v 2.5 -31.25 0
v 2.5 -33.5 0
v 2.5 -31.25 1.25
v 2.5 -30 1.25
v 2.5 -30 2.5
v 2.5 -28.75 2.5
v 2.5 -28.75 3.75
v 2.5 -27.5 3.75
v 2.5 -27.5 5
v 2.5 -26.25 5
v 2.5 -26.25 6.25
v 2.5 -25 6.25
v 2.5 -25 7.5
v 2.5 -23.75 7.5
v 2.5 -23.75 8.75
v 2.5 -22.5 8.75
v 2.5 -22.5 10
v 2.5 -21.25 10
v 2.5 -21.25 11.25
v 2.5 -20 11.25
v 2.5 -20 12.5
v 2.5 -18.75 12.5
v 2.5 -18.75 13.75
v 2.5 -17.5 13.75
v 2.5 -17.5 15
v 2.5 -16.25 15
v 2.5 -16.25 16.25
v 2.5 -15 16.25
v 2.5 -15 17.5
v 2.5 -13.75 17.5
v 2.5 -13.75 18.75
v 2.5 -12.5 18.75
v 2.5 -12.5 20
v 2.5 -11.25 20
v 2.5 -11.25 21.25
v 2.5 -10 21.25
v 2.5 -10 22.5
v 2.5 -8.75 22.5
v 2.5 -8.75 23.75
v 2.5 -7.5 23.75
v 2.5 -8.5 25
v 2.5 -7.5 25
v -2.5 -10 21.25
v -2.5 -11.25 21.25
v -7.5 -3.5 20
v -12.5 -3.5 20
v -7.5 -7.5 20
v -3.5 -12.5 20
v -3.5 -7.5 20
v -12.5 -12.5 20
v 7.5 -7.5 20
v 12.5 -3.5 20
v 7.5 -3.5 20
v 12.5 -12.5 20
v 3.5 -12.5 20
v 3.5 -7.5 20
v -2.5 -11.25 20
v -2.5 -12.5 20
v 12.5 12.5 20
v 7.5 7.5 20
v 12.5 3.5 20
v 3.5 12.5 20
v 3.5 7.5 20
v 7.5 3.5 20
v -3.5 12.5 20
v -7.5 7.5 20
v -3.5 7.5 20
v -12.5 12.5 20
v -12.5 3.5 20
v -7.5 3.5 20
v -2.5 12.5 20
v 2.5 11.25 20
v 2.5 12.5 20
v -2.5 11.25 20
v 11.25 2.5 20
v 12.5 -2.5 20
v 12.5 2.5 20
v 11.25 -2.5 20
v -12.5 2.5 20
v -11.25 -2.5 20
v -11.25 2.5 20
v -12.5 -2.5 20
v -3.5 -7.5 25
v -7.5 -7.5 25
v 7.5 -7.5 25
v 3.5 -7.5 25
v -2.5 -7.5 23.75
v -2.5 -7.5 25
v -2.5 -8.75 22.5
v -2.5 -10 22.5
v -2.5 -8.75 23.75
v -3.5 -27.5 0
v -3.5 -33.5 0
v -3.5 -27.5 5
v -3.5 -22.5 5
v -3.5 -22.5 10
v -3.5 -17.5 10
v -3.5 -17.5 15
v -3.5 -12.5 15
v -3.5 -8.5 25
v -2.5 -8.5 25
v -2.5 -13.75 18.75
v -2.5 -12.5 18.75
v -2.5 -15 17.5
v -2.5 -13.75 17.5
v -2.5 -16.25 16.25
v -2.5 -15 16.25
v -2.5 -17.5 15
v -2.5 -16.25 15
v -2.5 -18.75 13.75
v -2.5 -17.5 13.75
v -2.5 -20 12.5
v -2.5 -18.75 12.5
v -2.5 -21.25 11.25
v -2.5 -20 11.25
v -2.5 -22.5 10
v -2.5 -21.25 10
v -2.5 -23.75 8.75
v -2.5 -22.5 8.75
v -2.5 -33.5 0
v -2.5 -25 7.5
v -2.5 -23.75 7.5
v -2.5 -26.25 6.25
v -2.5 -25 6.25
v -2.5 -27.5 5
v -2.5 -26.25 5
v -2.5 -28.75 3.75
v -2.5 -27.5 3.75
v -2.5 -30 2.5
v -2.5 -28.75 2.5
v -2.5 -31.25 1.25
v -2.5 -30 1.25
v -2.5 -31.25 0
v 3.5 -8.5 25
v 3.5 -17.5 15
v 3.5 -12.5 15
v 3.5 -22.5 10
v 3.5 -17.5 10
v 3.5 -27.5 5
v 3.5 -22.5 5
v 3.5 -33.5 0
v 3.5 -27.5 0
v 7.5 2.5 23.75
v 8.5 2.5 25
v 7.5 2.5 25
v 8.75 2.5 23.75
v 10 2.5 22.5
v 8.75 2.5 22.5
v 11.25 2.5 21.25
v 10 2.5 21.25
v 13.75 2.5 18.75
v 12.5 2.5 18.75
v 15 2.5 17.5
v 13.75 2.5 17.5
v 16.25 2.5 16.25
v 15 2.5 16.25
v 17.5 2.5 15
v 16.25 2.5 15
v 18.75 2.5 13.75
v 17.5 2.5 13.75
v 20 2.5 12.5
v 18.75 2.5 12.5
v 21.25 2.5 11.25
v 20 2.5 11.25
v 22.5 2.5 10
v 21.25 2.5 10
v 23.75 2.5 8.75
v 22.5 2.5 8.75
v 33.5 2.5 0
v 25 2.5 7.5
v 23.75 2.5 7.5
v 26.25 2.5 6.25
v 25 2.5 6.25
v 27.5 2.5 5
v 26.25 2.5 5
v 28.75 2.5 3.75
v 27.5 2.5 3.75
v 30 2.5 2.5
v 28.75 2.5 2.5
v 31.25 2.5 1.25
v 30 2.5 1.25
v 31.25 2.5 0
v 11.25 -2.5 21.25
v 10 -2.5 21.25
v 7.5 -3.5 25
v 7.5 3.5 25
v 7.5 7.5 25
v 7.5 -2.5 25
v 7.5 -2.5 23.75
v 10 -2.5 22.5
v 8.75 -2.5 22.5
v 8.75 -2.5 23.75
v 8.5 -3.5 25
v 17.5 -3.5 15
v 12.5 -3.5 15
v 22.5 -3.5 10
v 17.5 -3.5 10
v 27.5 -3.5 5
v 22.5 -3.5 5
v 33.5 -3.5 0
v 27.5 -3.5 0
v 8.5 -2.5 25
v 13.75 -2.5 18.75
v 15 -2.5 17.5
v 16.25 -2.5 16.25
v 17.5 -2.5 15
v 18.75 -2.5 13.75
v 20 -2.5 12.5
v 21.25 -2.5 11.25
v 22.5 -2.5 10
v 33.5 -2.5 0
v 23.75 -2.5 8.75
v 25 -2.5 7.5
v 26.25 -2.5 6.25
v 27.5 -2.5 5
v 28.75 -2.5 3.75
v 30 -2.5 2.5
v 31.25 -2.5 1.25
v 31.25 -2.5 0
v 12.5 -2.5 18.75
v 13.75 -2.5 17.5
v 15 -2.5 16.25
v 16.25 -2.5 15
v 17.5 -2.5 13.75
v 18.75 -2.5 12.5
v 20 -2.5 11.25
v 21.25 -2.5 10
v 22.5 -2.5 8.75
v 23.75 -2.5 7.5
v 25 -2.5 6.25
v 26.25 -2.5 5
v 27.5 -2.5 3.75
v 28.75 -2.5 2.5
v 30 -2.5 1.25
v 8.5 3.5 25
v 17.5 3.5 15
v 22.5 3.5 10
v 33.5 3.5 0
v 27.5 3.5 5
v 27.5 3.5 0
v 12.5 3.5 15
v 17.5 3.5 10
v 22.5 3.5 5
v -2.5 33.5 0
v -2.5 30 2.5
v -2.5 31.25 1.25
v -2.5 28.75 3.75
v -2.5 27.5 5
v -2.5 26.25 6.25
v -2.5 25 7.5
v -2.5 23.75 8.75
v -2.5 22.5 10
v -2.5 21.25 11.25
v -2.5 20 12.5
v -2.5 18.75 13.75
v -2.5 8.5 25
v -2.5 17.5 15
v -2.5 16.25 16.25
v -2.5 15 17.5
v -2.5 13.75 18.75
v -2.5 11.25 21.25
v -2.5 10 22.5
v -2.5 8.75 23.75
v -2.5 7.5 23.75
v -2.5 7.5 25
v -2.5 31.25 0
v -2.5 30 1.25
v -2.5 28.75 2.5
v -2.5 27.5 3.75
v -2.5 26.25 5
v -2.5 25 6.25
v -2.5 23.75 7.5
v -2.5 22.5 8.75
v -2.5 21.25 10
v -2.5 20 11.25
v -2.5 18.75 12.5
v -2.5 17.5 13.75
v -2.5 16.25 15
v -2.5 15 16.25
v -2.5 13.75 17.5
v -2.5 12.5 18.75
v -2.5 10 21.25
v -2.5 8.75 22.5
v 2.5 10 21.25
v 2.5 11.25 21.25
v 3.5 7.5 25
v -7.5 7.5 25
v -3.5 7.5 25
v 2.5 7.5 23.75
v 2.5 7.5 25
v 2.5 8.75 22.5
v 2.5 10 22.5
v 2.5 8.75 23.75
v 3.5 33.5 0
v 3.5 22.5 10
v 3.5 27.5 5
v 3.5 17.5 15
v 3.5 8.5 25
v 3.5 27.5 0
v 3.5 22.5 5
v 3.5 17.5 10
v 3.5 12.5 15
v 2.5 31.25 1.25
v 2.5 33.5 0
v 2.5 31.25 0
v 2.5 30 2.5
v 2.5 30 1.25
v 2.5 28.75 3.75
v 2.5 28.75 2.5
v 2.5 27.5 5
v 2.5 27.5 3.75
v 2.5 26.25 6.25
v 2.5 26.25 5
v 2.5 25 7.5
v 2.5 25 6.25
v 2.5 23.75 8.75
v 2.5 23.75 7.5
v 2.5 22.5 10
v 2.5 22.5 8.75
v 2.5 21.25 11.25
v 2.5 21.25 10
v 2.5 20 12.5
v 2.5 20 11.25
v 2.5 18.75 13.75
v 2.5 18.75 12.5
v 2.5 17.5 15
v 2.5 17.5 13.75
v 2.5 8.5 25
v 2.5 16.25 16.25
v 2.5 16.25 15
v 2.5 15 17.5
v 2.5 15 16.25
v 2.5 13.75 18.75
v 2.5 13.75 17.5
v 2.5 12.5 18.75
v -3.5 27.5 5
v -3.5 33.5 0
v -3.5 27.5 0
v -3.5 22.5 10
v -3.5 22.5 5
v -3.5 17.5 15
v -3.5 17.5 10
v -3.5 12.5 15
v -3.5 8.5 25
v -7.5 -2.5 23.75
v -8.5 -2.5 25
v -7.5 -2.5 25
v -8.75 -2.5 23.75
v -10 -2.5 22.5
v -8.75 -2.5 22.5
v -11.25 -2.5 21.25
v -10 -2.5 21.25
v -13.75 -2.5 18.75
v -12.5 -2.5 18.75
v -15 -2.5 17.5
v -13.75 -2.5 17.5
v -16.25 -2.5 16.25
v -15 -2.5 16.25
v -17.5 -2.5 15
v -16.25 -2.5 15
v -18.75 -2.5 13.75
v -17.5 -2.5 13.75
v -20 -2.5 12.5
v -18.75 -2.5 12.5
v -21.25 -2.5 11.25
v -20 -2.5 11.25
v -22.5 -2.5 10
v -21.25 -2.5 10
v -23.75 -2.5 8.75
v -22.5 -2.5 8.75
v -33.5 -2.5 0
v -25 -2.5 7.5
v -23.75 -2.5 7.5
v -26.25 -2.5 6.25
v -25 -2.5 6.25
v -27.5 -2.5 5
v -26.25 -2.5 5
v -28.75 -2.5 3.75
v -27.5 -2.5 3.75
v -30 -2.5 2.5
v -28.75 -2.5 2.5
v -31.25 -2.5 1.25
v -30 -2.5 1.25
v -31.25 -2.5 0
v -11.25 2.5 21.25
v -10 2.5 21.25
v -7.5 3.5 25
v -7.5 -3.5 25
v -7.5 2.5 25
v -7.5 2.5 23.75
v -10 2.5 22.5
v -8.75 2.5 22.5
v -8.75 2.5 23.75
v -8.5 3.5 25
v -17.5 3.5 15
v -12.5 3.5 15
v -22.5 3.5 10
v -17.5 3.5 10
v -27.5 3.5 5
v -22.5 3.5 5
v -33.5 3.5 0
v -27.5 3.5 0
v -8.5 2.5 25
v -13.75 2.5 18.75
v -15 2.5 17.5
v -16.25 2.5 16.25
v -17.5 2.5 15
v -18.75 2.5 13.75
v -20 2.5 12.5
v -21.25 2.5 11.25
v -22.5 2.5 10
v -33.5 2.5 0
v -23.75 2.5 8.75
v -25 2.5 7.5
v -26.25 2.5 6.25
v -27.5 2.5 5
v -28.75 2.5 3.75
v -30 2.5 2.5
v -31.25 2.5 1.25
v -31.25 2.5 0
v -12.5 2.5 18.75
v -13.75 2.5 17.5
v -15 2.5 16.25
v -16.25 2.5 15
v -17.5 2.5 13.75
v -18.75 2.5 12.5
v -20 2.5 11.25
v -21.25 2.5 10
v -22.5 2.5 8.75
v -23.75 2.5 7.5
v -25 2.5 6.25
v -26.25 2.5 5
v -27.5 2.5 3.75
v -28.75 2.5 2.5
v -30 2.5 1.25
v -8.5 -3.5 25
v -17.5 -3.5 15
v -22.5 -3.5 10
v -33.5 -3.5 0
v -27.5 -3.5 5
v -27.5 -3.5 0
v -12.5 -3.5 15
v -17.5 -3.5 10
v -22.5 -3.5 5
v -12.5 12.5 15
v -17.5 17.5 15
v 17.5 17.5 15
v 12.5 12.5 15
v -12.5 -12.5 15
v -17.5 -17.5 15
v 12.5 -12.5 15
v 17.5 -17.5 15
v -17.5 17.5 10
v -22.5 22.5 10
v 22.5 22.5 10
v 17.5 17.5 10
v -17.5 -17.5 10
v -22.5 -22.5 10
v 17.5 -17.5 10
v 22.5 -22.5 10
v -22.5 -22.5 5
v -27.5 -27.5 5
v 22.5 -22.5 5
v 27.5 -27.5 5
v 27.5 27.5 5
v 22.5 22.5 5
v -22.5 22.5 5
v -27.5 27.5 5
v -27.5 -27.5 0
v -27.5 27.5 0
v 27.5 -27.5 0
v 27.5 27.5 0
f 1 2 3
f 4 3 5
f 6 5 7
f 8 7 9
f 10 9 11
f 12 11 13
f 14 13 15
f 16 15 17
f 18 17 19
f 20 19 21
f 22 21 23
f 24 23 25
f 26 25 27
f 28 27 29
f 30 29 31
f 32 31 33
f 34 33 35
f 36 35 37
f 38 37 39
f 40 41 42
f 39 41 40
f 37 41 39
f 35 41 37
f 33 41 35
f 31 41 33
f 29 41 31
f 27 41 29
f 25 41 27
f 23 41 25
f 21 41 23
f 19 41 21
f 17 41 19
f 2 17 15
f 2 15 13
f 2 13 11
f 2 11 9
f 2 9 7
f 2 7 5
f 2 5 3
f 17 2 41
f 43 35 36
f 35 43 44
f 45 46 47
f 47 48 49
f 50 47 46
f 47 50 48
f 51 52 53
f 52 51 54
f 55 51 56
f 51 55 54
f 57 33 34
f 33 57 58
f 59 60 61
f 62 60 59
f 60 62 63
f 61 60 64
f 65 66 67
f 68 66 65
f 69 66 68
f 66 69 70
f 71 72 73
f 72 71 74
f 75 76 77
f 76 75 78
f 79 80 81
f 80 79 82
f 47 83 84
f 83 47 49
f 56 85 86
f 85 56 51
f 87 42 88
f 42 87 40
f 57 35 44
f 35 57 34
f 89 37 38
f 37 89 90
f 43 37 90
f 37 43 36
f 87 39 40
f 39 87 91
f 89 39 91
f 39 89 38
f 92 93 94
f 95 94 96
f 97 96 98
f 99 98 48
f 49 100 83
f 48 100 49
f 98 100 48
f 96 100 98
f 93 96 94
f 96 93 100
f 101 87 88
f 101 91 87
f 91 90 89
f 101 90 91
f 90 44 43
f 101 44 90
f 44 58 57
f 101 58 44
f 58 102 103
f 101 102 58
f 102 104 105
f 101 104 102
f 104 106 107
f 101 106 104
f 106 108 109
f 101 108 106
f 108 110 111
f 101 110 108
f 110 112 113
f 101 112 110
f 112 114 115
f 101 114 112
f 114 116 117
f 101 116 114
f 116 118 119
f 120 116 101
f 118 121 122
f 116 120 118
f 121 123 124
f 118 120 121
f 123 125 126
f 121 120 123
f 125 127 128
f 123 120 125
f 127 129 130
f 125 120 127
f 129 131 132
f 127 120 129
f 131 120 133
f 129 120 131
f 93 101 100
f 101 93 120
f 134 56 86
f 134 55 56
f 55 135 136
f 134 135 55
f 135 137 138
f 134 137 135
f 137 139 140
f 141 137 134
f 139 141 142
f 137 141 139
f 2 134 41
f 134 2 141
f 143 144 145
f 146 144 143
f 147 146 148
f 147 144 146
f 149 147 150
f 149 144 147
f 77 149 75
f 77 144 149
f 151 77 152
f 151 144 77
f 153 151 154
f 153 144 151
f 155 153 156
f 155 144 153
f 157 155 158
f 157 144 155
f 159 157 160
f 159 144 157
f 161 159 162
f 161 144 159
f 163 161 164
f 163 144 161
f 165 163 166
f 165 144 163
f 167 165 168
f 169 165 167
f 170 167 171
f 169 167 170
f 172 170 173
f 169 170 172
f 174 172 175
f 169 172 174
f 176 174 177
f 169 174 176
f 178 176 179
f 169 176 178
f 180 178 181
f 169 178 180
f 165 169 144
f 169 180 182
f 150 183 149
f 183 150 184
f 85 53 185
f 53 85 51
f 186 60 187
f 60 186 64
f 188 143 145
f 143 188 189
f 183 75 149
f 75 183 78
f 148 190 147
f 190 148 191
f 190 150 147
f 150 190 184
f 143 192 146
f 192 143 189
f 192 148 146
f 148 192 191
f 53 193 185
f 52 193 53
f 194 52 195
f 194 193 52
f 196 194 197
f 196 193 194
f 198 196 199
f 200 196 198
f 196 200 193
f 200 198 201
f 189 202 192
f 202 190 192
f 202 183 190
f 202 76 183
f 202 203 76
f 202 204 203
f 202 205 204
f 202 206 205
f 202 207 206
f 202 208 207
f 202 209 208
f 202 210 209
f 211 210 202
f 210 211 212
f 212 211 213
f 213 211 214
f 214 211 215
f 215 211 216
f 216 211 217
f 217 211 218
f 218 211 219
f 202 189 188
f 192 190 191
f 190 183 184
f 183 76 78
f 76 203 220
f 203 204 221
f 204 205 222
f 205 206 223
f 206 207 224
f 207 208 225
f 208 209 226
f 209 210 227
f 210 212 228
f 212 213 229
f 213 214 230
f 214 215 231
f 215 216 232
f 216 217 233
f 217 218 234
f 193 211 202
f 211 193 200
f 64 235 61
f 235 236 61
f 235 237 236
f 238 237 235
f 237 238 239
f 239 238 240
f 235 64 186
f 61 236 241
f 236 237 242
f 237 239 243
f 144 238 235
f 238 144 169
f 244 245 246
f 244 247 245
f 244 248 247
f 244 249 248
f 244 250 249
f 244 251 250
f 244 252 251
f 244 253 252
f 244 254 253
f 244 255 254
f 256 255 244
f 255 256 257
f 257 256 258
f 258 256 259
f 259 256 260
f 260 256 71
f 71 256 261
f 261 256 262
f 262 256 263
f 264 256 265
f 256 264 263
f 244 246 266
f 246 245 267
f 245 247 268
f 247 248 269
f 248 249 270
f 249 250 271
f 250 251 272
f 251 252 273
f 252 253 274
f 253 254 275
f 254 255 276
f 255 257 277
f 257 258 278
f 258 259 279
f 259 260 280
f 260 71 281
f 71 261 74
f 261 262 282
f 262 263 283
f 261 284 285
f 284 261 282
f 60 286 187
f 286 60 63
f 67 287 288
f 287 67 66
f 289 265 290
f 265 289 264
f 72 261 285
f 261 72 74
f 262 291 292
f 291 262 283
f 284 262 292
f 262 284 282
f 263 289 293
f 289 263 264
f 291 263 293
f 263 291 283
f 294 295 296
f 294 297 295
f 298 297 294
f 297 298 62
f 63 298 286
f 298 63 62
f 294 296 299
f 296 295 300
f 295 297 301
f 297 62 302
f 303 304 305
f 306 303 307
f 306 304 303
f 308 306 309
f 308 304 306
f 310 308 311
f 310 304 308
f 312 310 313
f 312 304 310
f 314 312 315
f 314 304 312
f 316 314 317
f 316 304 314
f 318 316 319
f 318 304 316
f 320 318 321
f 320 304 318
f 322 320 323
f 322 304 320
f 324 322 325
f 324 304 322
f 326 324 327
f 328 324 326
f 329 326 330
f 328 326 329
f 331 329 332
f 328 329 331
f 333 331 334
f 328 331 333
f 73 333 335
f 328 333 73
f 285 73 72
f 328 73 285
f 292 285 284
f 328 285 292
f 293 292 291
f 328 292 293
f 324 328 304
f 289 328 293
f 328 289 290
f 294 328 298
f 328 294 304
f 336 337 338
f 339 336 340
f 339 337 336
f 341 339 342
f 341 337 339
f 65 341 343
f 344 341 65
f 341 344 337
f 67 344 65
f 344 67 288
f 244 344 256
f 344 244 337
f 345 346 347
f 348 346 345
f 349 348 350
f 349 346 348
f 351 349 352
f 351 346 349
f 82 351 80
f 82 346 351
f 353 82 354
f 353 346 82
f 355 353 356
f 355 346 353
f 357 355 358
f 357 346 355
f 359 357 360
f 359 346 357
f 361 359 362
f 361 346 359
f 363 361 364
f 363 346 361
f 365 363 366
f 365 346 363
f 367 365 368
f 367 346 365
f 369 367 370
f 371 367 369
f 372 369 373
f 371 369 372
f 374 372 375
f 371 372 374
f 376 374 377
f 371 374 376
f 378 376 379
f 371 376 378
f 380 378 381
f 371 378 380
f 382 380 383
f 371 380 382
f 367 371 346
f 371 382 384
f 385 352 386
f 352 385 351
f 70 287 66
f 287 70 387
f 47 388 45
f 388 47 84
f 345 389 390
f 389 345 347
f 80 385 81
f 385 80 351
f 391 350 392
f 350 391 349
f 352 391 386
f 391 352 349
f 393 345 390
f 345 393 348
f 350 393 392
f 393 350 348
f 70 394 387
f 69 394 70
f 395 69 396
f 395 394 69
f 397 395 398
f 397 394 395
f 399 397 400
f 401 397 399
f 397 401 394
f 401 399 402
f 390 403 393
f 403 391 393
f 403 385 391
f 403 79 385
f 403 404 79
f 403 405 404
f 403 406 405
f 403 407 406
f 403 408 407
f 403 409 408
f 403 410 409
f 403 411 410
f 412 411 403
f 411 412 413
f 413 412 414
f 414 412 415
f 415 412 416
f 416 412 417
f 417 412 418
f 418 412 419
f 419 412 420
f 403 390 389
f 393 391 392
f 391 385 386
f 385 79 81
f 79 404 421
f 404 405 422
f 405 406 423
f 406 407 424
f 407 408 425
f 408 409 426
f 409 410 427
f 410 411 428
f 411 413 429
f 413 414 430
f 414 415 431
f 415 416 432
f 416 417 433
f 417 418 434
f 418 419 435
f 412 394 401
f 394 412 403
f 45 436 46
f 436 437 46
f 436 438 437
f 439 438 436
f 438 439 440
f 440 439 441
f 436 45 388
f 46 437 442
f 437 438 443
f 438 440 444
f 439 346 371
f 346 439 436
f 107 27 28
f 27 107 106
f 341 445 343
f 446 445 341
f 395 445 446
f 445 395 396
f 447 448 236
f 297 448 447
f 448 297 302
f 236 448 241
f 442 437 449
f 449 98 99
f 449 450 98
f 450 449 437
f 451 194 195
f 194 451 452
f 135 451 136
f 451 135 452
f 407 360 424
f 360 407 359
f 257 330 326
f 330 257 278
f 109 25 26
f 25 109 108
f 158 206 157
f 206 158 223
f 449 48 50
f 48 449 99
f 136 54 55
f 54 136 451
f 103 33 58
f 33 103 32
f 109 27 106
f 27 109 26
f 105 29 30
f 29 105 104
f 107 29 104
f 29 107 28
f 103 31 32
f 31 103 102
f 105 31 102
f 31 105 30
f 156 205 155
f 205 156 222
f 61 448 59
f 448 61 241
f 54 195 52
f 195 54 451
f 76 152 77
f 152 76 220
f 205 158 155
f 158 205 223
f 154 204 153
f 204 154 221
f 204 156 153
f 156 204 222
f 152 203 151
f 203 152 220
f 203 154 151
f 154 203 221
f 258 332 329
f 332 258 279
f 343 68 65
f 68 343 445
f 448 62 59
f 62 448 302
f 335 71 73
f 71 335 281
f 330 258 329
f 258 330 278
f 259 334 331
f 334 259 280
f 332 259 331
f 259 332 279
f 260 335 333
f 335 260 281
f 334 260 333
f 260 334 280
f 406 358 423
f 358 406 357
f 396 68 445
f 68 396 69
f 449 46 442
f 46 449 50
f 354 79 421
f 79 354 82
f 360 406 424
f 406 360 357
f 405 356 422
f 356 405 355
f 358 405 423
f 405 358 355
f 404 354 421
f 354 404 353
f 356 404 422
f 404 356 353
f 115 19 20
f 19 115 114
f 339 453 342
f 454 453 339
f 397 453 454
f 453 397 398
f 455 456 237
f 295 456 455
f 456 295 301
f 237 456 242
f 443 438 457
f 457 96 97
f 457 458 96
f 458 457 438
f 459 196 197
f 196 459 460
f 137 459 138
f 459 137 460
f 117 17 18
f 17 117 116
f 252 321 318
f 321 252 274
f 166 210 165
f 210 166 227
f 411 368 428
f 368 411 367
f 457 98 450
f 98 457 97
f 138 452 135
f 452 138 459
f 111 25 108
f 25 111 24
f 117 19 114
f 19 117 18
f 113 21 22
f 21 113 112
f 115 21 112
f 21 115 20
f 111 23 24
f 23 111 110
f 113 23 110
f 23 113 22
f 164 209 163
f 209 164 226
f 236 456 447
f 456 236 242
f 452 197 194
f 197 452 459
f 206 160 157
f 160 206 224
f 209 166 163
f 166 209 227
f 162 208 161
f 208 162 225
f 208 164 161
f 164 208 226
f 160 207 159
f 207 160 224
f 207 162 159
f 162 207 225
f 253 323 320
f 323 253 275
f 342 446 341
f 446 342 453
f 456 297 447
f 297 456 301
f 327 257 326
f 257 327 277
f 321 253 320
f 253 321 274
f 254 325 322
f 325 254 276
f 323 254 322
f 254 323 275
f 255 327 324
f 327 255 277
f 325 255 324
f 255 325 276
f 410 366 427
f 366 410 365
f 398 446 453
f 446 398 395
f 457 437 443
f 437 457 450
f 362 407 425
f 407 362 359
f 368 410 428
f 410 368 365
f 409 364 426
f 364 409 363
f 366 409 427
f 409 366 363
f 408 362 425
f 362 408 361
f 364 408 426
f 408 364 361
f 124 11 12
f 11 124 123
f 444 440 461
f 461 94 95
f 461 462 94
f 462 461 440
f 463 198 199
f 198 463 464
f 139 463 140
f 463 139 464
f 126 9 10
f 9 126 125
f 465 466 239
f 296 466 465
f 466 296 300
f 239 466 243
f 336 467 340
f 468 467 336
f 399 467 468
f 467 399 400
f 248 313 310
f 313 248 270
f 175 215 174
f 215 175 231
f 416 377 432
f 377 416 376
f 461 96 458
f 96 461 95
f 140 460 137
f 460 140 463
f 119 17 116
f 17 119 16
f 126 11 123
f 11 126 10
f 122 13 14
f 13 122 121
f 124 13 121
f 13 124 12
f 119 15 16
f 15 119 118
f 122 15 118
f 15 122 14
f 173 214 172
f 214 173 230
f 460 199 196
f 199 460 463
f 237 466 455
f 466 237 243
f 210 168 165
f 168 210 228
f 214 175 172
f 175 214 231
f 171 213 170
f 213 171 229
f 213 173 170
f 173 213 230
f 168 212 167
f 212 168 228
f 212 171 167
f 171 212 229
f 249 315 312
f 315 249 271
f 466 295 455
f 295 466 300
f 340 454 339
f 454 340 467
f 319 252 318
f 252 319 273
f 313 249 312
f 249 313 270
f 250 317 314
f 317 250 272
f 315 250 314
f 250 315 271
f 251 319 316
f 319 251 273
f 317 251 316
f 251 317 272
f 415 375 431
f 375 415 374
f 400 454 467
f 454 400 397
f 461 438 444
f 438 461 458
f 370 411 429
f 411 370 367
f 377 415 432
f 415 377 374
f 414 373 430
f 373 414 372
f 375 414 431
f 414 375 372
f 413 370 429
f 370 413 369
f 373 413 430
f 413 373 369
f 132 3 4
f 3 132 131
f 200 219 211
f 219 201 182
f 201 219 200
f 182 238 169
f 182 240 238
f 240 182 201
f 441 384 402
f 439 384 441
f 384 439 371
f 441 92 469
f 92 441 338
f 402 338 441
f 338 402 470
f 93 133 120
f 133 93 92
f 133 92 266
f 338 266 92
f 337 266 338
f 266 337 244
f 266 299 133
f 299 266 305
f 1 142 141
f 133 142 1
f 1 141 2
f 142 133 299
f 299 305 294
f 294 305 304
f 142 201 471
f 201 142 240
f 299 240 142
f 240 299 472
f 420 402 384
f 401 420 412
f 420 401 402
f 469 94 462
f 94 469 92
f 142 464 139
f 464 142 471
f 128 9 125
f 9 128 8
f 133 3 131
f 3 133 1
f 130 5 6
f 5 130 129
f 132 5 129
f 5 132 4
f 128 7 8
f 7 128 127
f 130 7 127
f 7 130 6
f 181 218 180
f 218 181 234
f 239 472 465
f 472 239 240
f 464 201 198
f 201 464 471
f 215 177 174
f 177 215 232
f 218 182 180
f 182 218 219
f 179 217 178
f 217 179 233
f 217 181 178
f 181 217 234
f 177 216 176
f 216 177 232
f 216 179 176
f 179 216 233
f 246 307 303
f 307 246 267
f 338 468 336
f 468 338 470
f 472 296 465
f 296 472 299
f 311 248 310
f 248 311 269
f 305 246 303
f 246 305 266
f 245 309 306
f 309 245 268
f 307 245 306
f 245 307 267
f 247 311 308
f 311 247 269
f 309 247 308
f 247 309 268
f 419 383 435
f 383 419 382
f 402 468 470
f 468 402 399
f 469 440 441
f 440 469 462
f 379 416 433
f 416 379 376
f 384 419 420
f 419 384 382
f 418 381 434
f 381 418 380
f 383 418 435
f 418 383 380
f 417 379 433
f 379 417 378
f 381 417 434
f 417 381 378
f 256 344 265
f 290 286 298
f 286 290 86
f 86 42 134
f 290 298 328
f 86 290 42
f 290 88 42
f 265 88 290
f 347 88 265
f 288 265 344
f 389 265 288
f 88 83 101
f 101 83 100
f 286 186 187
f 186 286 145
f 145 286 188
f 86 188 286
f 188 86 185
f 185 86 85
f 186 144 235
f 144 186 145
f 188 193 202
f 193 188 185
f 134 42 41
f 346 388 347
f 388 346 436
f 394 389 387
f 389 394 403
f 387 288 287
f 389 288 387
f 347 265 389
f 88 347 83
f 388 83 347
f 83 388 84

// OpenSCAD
// ****************************************************
//              INCA Pyramid
// By:          Humberto Kelkboom 
// Date:        17 Oct 2014
//
//*****************************************************


//Set the scaling of the Object. Standard it base is 1x1x1
ScaleFactor = 5;

//Set the number of levels of the Pyramid
Nivo = 5 ;


scale([ScaleFactor,ScaleFactor,ScaleFactor])
difference()
{
union() 
{
    for ( i = [1 : Nivo] )
    {
        translate([(i*-1)-0.5,(i*-1)-0.5,Nivo-i]) cube([1+(i*2),1+(i*2),1]);
        
        for(rot=[0:3])
        {
            rotate([0,0,rot*90]) 
            {
                for(tr=[1:4])
                {
                    translate([-0.5,-0.5-i-(1-(0.25*tr)),Nivo-i]) cube([1,(1-(0.25*tr)),0.25*tr]);
                }           

                translate([-0.7,-0.5-i,Nivo-i])
                rotate([180,-90,0]) linear_extrude(height=0.2) polygon([[0,0],[0,1.2],[1.2,0]]);
                
                translate([0.5,-0.5-i,Nivo-i])
                rotate([180,-90,0]) linear_extrude(height=0.2) polygon([[0,0],[0,1.2],[1.2,0]]);
            }
        }       
    }

}
translate([(1*-1)-0.75,(1*-1)-0.75,Nivo]) cube([1.5+(1*2),1.5+(1*2),0.3]);

};
